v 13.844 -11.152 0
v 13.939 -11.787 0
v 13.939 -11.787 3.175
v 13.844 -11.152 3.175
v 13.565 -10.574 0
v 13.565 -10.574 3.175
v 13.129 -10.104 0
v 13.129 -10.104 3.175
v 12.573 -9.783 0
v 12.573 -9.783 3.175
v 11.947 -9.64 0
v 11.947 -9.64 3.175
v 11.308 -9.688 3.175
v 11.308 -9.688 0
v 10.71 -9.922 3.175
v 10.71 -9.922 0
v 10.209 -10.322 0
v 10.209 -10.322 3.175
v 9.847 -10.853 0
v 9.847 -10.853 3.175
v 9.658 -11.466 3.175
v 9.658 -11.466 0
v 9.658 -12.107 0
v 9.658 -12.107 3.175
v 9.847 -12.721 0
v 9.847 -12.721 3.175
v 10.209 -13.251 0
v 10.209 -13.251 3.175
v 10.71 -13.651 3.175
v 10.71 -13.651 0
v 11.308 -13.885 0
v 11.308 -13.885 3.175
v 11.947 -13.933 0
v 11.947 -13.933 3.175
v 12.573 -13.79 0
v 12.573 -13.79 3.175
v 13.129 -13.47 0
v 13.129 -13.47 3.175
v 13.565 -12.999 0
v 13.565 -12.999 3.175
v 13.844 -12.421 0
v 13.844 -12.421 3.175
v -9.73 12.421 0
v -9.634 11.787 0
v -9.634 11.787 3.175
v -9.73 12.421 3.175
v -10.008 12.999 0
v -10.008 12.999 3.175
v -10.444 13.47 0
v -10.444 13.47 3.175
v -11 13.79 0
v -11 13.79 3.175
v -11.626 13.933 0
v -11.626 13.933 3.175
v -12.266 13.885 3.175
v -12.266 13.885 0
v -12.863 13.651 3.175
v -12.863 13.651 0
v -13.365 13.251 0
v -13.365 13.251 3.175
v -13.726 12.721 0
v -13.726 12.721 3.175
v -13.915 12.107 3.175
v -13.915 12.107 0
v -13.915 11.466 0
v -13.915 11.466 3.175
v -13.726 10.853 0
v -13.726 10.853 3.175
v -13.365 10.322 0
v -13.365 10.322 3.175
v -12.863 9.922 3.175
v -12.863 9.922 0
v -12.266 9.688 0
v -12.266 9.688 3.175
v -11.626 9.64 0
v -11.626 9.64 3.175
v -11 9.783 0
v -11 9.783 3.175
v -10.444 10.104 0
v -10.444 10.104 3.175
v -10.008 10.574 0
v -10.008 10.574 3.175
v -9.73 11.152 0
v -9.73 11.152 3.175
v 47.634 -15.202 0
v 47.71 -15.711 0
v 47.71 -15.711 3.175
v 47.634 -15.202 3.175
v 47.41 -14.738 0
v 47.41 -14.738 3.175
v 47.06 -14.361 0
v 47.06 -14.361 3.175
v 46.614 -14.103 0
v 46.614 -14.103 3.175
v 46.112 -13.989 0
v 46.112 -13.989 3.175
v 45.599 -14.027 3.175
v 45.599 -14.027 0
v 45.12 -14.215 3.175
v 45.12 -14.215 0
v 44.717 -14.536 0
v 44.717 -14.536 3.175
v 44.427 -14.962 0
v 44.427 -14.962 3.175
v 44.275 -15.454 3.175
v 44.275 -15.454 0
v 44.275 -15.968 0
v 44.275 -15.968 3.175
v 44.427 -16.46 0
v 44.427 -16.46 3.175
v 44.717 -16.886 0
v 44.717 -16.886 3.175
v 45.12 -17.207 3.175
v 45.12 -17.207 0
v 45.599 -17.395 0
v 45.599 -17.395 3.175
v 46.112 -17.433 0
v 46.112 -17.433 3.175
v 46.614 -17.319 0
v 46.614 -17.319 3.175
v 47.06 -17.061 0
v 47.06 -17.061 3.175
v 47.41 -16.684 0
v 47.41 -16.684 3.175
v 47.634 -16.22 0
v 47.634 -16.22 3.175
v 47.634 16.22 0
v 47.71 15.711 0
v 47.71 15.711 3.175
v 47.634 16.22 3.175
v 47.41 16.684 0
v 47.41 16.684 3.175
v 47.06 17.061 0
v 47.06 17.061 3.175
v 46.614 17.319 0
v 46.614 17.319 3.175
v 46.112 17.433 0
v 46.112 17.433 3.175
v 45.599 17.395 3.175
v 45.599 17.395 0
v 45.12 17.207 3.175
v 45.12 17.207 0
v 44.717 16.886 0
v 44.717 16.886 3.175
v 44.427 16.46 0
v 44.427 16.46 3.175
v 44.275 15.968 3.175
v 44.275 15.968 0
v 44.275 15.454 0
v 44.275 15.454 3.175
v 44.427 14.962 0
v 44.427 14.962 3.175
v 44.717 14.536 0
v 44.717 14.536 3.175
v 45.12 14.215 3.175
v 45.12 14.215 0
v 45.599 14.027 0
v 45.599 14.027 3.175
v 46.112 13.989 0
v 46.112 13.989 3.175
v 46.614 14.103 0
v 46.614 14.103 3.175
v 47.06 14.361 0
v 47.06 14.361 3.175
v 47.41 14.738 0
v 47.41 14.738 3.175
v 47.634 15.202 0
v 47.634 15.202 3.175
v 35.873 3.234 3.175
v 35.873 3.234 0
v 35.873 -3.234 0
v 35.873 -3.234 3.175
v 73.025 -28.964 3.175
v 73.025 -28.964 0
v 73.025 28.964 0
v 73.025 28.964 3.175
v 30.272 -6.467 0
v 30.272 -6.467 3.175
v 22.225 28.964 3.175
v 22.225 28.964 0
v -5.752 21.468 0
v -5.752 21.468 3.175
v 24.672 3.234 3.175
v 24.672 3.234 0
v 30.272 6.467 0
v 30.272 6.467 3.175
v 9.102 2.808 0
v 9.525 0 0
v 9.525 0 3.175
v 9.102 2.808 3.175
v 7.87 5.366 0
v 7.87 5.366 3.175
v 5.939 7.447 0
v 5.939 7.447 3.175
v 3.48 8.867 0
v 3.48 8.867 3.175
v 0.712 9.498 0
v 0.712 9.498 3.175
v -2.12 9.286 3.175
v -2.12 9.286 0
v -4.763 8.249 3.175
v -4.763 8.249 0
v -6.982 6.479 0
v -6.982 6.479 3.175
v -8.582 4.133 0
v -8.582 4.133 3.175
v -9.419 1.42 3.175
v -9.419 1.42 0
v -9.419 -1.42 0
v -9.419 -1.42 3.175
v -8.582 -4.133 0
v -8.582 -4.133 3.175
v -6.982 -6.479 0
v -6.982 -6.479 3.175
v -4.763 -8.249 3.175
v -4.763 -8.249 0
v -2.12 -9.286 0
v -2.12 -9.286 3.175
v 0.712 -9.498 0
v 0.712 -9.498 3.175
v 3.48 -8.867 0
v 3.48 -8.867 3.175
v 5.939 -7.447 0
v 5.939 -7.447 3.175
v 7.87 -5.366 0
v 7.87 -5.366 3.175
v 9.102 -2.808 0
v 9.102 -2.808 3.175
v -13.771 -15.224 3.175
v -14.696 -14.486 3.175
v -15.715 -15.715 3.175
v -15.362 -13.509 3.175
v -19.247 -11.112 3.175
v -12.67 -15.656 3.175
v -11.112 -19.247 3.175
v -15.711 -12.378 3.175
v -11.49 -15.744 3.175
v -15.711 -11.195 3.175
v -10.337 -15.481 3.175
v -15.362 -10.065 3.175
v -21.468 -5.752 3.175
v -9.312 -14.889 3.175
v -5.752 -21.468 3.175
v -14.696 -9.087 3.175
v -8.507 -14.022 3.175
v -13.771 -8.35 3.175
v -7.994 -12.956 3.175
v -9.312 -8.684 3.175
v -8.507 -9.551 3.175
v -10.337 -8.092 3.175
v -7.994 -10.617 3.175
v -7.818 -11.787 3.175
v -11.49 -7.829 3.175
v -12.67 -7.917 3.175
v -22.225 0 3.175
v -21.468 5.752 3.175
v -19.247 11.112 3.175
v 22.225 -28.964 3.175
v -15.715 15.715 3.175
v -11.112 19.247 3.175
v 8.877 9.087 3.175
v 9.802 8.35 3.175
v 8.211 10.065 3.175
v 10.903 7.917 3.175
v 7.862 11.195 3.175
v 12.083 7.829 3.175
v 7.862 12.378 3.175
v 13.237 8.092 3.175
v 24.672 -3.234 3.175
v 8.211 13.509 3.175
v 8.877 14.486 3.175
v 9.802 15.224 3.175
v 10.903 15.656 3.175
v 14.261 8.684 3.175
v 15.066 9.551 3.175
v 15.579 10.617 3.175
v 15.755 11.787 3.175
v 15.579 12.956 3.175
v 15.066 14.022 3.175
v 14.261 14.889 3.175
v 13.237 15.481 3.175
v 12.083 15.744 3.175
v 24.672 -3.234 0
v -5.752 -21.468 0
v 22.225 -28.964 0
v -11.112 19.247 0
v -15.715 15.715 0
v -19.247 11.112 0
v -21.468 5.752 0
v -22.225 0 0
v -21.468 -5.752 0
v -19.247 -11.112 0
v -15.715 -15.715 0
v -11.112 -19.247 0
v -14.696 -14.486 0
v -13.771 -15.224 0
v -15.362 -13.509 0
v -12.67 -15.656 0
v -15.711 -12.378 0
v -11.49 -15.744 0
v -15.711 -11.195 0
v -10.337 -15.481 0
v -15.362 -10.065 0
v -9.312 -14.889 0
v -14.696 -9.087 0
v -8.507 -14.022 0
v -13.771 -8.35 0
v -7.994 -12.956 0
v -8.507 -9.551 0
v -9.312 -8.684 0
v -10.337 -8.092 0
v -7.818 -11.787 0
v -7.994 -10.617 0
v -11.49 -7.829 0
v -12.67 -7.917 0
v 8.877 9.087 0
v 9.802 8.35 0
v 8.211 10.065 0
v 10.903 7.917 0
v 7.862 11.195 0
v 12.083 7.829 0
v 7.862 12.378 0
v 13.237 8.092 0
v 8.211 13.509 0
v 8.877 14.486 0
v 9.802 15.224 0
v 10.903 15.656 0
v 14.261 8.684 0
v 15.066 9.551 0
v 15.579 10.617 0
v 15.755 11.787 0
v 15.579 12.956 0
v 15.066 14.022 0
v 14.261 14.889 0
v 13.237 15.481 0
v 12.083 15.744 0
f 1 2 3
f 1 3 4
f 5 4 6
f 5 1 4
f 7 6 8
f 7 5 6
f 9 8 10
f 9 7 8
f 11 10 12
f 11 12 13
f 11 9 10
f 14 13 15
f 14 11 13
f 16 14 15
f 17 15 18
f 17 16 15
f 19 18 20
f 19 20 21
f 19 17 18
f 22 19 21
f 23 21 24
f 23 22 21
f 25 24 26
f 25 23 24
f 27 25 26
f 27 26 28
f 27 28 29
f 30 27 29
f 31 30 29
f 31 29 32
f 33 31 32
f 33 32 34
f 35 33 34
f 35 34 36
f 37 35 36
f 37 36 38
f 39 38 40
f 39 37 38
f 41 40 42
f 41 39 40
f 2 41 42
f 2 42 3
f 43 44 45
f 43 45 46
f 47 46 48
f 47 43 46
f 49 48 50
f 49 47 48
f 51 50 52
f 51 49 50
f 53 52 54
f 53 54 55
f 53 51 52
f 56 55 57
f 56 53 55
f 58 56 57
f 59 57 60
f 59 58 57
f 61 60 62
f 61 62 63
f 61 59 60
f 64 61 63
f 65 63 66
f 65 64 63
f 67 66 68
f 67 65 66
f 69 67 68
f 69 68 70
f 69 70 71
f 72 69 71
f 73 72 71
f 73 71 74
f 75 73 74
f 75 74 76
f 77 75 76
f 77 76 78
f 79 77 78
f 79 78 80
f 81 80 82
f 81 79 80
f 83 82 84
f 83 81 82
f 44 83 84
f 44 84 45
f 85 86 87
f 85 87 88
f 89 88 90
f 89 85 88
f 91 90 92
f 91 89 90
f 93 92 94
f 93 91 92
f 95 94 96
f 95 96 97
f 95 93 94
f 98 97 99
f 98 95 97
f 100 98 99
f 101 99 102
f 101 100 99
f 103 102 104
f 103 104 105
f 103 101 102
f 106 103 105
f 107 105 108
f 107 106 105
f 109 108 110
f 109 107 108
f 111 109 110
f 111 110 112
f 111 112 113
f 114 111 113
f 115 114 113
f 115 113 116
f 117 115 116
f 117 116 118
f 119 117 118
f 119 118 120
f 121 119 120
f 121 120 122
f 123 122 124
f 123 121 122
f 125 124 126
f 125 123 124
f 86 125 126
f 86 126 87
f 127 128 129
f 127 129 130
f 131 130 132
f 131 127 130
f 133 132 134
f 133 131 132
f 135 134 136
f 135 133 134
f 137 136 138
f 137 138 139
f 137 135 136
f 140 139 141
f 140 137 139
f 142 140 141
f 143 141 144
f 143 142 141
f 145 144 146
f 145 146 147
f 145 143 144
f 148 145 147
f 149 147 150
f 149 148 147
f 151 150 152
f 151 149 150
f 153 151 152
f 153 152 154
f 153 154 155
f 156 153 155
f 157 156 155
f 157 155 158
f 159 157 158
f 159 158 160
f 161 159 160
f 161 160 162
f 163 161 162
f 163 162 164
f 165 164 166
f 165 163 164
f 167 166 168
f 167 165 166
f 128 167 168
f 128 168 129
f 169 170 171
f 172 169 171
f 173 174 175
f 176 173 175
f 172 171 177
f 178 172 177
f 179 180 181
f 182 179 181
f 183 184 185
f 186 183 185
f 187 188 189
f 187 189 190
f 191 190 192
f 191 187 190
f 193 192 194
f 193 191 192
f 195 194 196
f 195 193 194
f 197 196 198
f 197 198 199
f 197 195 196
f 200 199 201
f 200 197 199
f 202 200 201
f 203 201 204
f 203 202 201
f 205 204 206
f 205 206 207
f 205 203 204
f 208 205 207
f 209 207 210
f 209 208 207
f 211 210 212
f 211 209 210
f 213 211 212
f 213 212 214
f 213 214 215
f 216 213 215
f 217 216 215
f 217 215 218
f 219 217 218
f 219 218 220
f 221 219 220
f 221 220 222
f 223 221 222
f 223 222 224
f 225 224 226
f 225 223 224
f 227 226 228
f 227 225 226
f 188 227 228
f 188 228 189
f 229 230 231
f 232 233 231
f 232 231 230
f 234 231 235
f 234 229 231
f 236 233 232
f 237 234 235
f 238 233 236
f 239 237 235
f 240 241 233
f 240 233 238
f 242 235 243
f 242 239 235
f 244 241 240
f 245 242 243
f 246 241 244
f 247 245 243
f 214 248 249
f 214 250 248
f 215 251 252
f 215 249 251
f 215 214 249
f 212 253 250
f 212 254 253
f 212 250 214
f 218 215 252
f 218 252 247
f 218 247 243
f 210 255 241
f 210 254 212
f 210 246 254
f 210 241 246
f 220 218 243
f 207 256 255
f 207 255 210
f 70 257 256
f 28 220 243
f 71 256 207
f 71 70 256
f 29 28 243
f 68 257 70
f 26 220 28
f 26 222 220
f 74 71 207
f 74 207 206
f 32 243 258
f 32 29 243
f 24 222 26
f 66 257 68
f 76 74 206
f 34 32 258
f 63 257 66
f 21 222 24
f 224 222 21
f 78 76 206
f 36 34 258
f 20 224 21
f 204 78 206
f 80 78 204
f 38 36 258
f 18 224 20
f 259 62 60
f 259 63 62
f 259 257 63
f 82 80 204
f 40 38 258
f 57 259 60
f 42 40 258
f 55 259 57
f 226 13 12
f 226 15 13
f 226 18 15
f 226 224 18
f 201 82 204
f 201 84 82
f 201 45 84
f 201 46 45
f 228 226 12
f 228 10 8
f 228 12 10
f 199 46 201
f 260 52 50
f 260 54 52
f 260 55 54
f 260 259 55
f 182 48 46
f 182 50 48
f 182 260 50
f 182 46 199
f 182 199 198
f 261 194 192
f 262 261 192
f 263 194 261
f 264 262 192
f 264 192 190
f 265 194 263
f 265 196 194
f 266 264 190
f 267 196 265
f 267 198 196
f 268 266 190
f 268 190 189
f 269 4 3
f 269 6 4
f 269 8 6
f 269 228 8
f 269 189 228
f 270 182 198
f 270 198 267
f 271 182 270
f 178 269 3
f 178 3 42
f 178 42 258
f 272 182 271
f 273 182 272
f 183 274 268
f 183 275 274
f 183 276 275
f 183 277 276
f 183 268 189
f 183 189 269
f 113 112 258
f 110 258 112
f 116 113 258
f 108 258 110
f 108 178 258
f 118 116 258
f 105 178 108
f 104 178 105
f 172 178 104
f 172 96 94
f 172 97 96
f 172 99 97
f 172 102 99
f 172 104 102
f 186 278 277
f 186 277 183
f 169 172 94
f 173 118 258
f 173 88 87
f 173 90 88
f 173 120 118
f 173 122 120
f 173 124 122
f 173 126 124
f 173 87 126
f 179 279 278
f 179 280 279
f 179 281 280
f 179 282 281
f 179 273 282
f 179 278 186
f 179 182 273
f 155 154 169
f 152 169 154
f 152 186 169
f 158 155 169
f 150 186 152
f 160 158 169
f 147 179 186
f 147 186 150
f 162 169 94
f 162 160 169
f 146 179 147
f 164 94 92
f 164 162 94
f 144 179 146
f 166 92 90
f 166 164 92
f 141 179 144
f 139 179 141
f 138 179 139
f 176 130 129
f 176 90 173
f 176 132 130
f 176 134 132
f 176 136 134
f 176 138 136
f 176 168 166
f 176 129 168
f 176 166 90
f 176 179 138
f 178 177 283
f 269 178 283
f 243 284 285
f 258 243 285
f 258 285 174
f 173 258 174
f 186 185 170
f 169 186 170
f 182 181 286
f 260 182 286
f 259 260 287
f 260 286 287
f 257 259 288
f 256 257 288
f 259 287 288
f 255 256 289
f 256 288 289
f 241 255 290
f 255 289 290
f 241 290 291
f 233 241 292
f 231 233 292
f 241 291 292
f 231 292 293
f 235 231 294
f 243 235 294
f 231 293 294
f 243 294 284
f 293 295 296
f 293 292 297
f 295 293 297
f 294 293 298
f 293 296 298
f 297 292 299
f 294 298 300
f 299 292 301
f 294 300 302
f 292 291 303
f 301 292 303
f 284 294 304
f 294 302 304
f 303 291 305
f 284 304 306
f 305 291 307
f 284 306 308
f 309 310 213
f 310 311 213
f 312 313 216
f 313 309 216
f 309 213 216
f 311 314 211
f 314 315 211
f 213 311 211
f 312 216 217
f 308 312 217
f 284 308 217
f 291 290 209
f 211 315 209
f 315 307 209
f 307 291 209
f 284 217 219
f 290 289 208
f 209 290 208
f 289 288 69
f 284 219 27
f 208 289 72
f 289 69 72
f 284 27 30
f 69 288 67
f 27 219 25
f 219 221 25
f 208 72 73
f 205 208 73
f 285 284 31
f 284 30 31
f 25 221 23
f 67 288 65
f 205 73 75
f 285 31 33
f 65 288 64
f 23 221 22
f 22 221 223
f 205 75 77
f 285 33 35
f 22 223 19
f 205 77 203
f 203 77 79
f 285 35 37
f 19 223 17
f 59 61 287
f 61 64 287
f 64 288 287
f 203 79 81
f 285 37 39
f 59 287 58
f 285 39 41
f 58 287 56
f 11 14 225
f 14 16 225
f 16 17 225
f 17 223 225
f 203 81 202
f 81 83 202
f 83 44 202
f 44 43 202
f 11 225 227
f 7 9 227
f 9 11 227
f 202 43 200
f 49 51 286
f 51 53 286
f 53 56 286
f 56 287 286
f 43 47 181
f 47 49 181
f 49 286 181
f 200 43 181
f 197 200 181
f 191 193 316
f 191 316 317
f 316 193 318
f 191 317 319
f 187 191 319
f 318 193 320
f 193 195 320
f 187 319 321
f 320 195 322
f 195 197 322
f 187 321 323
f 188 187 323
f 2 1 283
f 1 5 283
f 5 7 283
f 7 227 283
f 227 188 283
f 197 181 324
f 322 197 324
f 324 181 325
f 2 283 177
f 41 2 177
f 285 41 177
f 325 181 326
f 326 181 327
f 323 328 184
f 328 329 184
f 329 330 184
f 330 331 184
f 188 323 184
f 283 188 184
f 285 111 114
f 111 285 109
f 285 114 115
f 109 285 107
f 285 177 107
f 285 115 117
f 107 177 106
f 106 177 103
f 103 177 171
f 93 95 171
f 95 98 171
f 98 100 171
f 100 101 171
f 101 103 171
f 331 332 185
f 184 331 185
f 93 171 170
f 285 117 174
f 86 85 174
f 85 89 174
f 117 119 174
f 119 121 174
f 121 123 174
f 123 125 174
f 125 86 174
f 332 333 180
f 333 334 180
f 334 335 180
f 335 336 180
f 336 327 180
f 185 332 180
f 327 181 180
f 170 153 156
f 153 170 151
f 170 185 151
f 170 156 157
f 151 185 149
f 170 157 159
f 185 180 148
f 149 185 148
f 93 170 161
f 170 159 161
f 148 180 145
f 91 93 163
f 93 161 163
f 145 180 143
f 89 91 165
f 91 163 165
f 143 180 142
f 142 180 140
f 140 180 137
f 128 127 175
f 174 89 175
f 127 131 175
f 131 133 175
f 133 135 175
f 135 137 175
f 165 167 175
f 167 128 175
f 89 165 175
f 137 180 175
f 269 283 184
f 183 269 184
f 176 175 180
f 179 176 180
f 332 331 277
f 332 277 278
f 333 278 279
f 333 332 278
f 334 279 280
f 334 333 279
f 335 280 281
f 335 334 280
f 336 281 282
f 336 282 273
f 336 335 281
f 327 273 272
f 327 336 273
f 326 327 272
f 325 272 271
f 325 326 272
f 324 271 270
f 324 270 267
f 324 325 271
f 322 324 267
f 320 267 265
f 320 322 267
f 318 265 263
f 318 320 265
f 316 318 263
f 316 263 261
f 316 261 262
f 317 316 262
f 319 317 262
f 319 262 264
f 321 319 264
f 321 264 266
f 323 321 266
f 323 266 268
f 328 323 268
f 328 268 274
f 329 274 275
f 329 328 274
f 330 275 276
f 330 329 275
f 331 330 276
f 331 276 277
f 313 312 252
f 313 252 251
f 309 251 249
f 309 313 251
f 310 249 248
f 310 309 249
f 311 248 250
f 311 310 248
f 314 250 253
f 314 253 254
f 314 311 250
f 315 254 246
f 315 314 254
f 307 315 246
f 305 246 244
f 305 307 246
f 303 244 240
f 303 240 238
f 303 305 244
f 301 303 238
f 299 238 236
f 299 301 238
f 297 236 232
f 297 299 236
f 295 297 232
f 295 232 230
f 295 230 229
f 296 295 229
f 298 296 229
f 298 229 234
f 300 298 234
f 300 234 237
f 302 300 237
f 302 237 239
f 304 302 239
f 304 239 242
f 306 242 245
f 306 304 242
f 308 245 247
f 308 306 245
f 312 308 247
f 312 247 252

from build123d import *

# Parameters (mm, degrees)
F0_R     = 3.96875
F0_R_2   = 9.525
F0_R_3   = 2.15265
F0_R_4   = 1.7272
F1_DEPTH = 3.175


with BuildPart() as f1:
    # F0 (on Top) → F1 (new body)
    with BuildSketch(Plane.XY):
        with BuildLine():
            Line((73.025, 28.964184), (22.225, 28.964184))
            Line((22.225, 28.964184), (-5.752253, 21.467701))
            ThreePointArc((-5.752253, 21.467701), (-22.225, 0), (-5.752253, -21.467701))
            Line((-5.752253, -21.467701), (22.225, -28.964184))
            Line((22.225, -28.964184), (73.025, -28.964184))
            Line((73.025, -28.964184), (73.025, 28.964184))
        make_face()
        with Locations((-11.786586, -11.786586)):
            Circle(F0_R, mode=Mode.SUBTRACT)
        Circle(F0_R_2, mode=Mode.SUBTRACT)
        with Locations((11.786586, -11.786586)):
            Circle(F0_R_3, mode=Mode.SUBTRACT)
        with Locations((45.983293, -15.711065)):
            Circle(F0_R_4, mode=Mode.SUBTRACT)
        Polygon((30.272228, 6.467131), (35.872928, 3.233566), (35.872928, -3.233566), (30.272228, -6.467131), (24.671528, -3.233566), (24.671528, 3.233566), align=None, mode=Mode.SUBTRACT)
        with Locations((-11.786586, 11.786586)):
            Circle(F0_R_3, mode=Mode.SUBTRACT)
        with Locations((11.786586, 11.786586)):
            Circle(F0_R, mode=Mode.SUBTRACT)
        with Locations((45.983293, 15.711065)):
            Circle(F0_R_4, mode=Mode.SUBTRACT)
    extrude(amount=F1_DEPTH)


solid = f1.part
